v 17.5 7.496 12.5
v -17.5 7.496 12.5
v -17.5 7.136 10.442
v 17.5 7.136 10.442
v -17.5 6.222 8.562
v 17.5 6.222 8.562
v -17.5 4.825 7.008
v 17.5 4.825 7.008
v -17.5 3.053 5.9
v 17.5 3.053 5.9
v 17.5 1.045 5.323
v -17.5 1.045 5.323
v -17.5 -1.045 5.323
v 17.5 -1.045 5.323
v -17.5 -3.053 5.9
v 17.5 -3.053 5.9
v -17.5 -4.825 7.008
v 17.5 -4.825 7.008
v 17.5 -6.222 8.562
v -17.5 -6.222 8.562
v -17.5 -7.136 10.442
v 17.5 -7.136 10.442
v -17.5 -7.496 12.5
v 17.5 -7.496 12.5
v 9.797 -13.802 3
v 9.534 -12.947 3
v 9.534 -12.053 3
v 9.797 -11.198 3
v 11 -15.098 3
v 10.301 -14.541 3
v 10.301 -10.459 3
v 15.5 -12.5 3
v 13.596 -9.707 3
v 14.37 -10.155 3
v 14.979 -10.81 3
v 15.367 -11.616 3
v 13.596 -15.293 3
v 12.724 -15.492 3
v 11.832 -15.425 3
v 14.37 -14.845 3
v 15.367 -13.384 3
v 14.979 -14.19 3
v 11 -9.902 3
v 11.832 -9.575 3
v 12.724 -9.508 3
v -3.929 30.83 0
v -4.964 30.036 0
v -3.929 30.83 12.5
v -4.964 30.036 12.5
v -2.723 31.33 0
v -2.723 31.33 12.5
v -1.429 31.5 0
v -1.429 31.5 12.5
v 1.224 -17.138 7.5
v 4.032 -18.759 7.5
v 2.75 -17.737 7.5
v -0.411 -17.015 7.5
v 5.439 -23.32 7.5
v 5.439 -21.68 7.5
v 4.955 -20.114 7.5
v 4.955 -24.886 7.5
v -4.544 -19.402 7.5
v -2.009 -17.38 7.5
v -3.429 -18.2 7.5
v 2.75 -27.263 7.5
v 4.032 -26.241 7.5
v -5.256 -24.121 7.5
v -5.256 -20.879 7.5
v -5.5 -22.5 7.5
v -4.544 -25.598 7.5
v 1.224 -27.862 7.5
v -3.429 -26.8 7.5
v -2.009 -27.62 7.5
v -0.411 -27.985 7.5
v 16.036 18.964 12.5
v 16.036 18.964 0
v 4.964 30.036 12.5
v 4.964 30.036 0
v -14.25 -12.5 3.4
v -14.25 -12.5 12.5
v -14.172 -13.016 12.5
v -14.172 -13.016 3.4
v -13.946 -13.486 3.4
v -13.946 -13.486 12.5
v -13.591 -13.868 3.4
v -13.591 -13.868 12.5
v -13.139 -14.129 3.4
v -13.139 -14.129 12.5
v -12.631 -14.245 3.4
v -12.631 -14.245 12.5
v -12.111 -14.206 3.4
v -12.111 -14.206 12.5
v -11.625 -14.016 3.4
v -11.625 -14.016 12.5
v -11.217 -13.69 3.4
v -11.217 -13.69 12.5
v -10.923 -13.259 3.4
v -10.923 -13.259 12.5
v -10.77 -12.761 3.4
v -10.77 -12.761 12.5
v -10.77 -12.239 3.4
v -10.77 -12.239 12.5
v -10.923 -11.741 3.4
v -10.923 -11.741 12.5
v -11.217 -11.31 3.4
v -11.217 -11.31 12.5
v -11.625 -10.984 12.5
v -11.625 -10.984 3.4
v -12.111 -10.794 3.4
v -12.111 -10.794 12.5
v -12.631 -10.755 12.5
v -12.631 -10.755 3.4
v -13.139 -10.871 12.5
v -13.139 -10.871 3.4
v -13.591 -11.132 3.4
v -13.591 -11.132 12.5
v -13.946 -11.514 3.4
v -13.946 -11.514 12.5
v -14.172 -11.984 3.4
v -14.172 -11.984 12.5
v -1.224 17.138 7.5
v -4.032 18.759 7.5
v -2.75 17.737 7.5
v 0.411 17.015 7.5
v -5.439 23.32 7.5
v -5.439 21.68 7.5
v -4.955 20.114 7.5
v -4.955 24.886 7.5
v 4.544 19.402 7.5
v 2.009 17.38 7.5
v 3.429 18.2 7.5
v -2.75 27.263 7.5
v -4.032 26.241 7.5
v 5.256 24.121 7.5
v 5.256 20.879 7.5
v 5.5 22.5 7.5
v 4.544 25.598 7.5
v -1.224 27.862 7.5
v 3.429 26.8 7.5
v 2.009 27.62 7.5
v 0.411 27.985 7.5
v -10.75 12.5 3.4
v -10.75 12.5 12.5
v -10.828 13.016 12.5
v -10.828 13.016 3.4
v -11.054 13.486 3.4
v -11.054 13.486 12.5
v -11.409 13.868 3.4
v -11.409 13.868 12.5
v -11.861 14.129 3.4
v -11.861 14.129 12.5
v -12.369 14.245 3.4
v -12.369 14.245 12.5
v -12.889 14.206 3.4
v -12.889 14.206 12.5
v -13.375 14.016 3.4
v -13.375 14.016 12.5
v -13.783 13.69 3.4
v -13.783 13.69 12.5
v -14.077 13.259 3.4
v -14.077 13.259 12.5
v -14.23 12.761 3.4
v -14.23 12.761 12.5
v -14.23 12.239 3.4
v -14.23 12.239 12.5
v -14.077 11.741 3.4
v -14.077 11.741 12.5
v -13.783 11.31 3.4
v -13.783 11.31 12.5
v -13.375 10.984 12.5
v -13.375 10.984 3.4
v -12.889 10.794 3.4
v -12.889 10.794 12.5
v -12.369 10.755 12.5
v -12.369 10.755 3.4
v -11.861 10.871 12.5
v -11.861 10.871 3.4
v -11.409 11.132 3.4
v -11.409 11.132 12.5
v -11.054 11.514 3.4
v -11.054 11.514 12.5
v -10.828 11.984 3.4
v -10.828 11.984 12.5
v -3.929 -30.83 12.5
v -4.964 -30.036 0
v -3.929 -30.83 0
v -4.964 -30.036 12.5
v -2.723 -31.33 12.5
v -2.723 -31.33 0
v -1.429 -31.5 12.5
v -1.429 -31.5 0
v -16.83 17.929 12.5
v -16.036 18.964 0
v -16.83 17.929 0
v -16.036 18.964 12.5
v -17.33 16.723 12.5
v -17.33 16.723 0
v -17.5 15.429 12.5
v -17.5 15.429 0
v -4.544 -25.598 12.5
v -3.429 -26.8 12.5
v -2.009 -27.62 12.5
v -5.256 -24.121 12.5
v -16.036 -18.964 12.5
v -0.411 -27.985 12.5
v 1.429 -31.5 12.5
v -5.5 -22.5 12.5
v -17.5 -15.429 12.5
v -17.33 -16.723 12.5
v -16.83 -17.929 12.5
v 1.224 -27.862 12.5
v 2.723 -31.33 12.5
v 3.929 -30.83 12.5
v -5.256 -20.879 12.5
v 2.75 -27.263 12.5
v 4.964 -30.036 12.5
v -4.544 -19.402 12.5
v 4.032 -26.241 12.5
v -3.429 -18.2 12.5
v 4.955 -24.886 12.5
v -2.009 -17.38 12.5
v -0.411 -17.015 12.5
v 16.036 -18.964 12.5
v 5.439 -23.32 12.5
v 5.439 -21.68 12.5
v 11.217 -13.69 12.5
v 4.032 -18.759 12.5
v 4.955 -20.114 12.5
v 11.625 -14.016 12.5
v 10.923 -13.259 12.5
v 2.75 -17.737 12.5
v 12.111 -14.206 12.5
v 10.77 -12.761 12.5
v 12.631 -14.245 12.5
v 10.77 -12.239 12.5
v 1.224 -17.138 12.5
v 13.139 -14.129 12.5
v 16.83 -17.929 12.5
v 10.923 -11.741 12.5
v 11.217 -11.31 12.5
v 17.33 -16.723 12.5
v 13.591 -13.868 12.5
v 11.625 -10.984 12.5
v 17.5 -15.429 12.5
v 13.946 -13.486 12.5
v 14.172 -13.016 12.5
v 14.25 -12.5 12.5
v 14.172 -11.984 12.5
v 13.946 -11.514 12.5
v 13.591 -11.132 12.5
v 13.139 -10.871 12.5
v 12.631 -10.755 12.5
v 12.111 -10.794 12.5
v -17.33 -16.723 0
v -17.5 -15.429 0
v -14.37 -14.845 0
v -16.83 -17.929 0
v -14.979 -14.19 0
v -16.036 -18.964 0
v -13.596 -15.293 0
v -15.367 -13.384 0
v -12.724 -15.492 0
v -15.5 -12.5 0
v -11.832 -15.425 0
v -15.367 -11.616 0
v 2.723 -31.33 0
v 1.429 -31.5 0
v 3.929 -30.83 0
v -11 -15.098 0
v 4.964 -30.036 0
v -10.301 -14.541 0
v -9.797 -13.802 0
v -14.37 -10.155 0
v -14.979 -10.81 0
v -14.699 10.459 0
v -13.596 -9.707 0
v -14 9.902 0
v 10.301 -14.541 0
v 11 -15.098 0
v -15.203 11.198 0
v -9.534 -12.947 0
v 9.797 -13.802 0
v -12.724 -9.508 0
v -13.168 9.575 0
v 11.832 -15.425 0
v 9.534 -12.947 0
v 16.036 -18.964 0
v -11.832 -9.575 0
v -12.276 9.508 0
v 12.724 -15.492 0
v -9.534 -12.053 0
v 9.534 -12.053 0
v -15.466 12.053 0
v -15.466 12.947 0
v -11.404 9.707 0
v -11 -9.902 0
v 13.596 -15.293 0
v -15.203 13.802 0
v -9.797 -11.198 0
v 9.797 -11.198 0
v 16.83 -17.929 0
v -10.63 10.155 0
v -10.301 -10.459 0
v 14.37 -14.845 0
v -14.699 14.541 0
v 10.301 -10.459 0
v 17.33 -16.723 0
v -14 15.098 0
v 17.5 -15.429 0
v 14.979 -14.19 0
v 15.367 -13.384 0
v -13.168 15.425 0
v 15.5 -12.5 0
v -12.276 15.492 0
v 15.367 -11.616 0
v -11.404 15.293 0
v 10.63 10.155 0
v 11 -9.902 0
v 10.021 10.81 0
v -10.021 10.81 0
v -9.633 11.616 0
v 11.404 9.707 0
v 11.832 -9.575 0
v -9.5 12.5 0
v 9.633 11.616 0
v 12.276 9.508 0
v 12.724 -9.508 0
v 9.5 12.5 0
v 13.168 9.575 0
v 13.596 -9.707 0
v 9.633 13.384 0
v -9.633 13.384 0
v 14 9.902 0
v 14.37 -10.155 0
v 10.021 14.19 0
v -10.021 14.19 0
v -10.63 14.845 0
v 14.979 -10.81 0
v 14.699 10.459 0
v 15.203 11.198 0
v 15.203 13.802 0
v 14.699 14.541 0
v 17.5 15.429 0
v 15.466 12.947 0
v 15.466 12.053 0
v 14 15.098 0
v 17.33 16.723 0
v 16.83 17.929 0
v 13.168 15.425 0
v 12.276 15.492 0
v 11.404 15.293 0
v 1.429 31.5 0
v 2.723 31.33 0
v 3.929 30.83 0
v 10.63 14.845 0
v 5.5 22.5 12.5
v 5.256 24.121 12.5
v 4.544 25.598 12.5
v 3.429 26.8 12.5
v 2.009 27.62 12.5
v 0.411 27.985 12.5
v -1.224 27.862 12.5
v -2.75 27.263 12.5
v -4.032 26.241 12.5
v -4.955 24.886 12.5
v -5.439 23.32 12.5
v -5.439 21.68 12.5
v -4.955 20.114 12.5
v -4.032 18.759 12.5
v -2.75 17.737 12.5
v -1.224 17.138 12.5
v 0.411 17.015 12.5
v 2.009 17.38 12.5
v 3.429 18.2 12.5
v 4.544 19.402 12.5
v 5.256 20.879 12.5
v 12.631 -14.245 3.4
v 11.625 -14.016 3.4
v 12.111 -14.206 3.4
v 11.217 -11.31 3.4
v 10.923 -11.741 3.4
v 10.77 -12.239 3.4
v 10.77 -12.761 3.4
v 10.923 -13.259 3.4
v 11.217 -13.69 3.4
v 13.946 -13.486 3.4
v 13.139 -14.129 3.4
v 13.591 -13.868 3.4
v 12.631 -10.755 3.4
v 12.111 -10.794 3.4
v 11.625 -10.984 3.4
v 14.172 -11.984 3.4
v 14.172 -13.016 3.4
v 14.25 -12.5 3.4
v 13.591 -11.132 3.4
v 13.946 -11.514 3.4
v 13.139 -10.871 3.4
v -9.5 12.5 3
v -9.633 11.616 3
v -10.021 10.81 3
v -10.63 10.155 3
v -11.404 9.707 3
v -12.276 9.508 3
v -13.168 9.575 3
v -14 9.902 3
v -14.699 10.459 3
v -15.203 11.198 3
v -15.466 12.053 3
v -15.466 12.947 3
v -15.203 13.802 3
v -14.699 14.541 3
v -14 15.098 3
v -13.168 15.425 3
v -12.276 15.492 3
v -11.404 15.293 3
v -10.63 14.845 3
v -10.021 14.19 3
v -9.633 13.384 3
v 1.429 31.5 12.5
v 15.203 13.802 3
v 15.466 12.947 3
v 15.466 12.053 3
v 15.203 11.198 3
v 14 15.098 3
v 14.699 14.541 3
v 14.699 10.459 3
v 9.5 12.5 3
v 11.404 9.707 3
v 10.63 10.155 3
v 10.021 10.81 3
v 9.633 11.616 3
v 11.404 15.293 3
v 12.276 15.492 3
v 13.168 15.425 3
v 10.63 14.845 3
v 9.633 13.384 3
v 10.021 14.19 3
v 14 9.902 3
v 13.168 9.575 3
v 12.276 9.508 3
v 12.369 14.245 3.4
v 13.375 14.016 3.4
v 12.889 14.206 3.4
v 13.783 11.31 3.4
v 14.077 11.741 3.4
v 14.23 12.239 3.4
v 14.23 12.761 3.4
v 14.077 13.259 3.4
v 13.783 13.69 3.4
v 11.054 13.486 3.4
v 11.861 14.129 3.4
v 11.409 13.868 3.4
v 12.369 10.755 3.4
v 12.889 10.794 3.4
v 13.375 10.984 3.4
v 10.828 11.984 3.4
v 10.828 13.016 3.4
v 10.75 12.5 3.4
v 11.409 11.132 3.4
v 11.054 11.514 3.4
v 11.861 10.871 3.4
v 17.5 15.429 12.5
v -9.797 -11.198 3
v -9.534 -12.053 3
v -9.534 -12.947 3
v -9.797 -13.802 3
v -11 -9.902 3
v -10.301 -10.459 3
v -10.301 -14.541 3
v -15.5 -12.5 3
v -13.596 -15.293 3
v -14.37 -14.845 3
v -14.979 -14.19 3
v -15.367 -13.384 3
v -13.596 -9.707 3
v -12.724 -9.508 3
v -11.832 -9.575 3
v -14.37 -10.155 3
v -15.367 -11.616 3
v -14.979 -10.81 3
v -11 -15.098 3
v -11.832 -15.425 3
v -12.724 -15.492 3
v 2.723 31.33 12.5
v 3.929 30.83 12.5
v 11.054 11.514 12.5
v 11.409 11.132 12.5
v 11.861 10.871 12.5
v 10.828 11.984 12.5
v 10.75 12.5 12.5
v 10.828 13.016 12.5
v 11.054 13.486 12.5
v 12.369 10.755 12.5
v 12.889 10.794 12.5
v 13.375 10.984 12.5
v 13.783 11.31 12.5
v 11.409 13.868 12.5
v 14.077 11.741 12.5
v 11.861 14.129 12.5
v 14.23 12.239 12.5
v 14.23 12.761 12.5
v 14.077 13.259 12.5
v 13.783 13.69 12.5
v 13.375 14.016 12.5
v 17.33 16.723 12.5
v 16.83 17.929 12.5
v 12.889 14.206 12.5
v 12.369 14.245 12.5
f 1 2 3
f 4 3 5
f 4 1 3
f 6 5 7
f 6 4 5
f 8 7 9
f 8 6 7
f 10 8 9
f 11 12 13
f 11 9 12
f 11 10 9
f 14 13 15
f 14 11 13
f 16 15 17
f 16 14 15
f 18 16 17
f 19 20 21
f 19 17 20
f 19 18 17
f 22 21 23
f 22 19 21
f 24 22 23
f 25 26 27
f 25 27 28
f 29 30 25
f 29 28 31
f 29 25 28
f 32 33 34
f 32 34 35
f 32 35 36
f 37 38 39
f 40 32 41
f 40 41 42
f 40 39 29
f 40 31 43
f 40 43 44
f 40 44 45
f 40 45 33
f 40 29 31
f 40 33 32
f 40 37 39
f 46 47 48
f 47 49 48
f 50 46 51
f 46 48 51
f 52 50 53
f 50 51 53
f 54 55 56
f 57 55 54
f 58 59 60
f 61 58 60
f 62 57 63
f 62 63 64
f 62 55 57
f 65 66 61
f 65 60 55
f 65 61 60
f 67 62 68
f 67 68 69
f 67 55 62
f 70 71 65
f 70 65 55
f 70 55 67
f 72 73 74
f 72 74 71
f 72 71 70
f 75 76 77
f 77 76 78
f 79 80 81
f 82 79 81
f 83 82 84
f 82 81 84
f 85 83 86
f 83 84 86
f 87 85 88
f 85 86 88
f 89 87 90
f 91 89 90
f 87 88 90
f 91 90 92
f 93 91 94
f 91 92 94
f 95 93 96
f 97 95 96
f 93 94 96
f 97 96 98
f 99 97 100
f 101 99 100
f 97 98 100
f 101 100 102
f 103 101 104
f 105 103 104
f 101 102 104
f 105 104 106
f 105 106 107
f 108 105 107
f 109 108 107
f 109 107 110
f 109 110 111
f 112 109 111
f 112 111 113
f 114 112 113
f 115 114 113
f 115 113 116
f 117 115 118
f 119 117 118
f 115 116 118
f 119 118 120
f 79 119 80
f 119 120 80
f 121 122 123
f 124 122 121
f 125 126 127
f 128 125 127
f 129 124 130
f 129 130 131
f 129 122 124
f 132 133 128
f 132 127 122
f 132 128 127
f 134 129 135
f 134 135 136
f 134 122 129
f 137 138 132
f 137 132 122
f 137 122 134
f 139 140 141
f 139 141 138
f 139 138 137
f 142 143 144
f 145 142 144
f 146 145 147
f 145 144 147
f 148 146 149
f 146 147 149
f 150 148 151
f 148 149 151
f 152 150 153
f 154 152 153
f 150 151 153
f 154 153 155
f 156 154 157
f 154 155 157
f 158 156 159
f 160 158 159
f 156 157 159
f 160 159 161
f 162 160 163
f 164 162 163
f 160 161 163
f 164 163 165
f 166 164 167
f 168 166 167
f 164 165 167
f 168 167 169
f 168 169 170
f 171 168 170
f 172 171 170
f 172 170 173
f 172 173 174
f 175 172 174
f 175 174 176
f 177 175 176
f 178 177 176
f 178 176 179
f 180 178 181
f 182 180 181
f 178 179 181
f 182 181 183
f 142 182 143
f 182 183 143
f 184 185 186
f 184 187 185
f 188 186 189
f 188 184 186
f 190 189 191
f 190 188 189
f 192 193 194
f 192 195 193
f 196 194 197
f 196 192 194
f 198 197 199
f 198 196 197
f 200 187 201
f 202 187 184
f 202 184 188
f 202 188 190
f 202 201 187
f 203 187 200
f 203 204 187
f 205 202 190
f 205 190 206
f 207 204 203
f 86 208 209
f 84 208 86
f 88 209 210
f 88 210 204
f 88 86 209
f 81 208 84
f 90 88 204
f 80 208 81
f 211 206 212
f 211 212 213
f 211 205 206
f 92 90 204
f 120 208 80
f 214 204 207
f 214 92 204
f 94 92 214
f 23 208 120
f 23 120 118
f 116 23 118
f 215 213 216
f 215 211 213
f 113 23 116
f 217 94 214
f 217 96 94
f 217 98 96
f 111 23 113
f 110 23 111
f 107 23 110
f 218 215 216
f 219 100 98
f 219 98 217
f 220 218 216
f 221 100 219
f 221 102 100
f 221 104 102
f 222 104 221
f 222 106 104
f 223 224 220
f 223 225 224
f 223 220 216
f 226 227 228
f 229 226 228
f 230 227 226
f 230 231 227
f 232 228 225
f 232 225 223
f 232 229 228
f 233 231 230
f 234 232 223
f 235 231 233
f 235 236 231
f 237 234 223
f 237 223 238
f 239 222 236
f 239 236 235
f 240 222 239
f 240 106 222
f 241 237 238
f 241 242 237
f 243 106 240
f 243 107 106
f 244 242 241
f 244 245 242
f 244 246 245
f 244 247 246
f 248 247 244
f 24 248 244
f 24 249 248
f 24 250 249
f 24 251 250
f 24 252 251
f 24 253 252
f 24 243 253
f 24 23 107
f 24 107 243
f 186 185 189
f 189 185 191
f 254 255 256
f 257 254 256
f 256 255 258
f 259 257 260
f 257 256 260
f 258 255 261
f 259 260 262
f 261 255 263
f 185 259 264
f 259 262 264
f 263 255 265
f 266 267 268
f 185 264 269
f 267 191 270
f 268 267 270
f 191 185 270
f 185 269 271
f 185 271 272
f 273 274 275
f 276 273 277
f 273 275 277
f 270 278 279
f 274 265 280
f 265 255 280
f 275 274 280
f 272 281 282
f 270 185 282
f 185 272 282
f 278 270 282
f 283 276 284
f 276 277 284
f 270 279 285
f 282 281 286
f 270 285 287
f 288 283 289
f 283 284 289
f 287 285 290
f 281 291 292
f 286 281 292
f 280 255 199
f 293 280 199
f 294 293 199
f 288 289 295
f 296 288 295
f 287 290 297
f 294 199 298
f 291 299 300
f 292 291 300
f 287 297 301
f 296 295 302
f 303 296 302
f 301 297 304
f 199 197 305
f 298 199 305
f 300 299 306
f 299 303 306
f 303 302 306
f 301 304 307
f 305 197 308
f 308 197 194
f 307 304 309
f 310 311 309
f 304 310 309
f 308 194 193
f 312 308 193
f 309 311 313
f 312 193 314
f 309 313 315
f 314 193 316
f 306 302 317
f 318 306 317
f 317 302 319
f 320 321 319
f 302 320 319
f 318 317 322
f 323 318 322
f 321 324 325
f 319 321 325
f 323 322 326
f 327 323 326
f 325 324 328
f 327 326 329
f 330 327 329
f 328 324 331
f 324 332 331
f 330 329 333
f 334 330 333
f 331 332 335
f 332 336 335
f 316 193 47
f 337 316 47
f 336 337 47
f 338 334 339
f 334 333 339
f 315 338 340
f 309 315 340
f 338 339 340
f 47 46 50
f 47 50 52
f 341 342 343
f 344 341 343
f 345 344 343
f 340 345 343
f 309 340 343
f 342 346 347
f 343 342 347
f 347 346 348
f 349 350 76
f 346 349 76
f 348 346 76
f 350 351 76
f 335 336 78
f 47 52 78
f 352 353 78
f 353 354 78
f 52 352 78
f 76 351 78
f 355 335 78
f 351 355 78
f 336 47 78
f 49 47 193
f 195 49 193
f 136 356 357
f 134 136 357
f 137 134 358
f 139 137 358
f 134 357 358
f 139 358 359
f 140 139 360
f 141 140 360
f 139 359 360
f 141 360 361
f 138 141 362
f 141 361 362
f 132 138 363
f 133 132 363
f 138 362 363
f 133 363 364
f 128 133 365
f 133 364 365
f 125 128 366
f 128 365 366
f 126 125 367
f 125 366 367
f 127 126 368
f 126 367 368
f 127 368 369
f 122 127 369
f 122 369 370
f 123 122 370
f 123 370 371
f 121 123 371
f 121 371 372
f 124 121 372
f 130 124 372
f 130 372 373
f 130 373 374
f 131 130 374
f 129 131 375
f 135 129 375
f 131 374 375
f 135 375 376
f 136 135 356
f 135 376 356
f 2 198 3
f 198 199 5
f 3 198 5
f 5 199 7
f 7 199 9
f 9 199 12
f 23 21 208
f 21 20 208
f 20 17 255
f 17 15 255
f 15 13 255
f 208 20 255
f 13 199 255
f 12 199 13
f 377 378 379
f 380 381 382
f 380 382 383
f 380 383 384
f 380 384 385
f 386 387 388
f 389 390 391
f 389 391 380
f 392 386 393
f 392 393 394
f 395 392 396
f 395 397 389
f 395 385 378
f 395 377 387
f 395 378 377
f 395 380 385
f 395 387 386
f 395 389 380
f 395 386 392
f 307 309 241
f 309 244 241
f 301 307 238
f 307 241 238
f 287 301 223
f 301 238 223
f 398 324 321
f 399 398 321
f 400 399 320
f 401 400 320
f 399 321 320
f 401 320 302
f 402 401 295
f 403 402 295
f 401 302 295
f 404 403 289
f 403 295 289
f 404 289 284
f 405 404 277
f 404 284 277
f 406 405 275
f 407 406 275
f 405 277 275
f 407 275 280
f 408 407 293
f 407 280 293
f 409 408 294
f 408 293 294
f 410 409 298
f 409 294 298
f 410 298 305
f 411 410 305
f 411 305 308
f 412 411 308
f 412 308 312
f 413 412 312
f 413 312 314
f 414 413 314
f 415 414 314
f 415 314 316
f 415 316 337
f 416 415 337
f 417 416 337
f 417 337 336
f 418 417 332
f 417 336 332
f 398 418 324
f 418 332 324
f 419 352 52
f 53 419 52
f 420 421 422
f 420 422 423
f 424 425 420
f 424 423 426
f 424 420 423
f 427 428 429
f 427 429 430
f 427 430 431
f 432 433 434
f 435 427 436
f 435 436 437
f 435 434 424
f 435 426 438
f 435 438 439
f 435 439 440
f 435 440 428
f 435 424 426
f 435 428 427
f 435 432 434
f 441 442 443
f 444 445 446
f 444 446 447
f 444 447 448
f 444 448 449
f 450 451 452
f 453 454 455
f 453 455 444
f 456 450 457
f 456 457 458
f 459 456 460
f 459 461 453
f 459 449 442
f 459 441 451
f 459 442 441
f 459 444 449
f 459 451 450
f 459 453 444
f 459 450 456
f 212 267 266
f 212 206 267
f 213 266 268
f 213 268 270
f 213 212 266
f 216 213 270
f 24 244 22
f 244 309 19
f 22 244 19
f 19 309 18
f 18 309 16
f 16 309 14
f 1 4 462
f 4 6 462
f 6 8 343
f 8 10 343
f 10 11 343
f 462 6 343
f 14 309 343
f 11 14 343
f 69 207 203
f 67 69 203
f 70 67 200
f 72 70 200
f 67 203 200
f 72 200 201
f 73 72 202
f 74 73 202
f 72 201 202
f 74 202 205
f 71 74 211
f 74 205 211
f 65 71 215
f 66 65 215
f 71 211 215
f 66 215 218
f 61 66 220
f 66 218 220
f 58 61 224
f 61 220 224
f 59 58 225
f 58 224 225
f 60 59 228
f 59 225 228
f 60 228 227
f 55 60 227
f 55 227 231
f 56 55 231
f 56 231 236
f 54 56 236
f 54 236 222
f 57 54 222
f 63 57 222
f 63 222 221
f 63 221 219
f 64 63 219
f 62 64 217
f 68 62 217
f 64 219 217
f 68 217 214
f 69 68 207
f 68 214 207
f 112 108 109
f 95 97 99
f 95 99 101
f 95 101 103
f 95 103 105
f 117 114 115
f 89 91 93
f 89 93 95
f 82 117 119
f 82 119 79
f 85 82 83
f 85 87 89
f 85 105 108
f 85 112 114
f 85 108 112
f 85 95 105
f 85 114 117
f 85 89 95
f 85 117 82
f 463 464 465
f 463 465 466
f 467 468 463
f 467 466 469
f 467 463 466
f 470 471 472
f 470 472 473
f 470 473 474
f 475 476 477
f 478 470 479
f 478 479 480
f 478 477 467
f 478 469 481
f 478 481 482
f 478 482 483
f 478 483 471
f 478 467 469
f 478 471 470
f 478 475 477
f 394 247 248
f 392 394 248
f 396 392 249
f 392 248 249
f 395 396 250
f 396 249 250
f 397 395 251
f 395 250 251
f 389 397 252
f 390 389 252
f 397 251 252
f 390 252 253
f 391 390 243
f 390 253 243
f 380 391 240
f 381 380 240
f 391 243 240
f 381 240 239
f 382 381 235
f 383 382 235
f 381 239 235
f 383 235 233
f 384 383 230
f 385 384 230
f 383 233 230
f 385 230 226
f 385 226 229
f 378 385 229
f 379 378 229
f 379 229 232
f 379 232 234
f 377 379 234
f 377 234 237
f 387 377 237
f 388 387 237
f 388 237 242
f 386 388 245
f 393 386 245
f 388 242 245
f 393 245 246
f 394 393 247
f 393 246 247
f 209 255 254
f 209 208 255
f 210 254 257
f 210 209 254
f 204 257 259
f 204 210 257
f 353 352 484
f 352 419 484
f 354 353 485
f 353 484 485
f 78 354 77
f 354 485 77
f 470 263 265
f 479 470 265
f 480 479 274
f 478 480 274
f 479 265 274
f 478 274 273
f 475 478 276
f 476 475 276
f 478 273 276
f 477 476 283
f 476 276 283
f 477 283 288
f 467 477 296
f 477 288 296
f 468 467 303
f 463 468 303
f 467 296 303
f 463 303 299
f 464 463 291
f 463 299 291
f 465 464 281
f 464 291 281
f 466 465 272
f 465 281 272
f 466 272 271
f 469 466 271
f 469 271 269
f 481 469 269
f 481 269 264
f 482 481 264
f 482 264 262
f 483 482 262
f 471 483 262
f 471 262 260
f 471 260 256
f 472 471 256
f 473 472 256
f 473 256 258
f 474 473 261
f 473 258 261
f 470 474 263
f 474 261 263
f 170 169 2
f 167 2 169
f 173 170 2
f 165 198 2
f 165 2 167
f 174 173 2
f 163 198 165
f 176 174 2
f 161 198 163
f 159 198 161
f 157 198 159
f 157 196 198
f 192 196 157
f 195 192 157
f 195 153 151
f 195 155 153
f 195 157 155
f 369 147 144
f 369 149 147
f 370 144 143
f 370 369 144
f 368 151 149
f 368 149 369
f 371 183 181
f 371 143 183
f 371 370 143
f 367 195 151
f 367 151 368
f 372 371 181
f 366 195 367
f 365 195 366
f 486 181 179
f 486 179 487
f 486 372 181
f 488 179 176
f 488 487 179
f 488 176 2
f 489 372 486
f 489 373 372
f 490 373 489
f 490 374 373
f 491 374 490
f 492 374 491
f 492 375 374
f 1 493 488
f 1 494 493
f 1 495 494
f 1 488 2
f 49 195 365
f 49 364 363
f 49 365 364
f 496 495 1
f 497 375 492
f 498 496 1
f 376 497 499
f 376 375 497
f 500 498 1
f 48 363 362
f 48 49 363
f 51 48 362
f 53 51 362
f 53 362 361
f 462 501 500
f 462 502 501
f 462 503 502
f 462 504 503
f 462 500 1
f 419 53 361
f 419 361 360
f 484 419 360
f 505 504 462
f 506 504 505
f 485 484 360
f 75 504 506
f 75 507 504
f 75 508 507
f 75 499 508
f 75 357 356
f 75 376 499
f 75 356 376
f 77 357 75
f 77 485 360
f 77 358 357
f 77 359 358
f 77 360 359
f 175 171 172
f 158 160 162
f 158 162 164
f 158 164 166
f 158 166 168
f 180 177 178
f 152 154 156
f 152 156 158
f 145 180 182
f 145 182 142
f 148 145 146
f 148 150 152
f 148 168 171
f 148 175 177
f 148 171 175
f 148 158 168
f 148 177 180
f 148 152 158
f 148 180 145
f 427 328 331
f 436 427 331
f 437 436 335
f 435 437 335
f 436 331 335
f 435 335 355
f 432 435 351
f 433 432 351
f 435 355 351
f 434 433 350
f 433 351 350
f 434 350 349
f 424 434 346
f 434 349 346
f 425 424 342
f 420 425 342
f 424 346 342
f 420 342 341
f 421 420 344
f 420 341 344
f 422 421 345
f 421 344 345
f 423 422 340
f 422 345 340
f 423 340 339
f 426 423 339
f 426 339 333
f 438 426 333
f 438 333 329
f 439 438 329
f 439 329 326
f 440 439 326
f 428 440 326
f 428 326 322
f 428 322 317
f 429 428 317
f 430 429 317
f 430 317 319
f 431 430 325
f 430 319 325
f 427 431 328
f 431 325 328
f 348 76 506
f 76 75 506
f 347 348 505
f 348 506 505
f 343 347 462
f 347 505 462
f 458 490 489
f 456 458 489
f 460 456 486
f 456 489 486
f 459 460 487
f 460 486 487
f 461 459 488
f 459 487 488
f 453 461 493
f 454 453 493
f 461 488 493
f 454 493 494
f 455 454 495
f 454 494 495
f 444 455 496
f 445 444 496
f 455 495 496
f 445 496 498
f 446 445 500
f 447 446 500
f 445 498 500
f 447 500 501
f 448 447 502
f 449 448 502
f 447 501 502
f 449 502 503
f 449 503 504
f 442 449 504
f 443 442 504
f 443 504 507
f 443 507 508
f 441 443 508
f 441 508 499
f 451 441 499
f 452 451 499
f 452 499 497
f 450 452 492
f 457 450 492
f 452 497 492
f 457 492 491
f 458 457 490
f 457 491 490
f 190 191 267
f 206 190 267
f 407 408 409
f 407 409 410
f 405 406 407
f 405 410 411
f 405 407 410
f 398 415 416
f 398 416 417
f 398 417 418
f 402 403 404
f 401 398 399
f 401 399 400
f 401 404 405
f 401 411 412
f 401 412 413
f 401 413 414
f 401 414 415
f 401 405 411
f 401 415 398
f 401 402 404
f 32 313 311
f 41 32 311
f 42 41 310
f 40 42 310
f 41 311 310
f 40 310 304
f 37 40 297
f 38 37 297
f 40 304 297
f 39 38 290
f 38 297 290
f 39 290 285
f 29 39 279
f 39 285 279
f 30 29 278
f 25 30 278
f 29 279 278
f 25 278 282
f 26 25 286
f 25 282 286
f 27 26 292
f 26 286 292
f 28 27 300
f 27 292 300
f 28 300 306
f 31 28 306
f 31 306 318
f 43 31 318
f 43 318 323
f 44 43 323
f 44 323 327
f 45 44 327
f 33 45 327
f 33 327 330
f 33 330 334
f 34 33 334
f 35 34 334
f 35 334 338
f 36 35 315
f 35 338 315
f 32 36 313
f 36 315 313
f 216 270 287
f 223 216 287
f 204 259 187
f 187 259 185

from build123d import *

# Parameters (mm, degrees)
BOSS_EXTRUDE1_DEPTH = 12.5
CUT_EXTRUDE1_REACH  = 50.719
SKETCH3_R           = 3
CUT_EXTRUDE2_DEPTH  = 3
SKETCH4_R           = 5.5
CUT_EXTRUDE3_DEPTH  = 5
FILLET1_R           = 5
SKETCH5_R           = 1.75
CUT_EXTRUDE4_DEPTH  = 9.1


with BuildPart() as part:
    # Sketch1 → Boss-Extrude1 (new body)
    with BuildSketch(Plane.XY):
        Polygon((-3.5, 31.5), (-17.5, 17.5), (-17.5, -17.5), (-3.5, -31.5), (3.5, -31.5), (17.5, -17.5), (17.5, 17.5), (3.5, 31.5), align=None)
    extrude(amount=BOSS_EXTRUDE1_DEPTH)

    # Sketch2 → Cut-Extrude1 (cut, up to next)
    with BuildSketch(Plane(origin=(17.5, 0, 0), x_dir=(0, 0, -1), z_dir=(1, 0, 0)), mode=Mode.PRIVATE) as cut_extrude1_sk1:
        with BuildLine():
            Line((-12.5, -7.495832175), (-12.5, 7.495832175))
            ThreePointArc((-12.5, 7.495832175), (-5.25, 0), (-12.5, -7.495832175))
        make_face()
    cut_extrude1_tool1 = extrude(cut_extrude1_sk1.sketch, amount=-CUT_EXTRUDE1_REACH, mode=Mode.PRIVATE) & part.part
    add(cut_extrude1_tool1.solids().sort_by_distance((17.5, 0, 9.431384))[0], mode=Mode.SUBTRACT)

    # Sketch3 → Cut-Extrude2 (cut)
    with BuildSketch(Plane(origin=(0, 0, 0), x_dir=(-1, 0, 0), z_dir=(0, 0, -1))):
        with Locations((-12.5, 12.5)):
            Circle(SKETCH3_R)
        with Locations(Location((12.5, 12.5, 0), (0, 0, 180))):
            Circle(SKETCH3_R)
        with Locations((12.5, -12.5)):
            Circle(SKETCH3_R)
        with Locations(Location((-12.5, -12.5, 0), (0, 0, 180))):
            Circle(SKETCH3_R)
    extrude(amount=-CUT_EXTRUDE2_DEPTH, mode=Mode.SUBTRACT)

    # Sketch4 → Cut-Extrude3 (cut)
    with BuildSketch(Plane.XY.offset(12.5)):
        with Locations((0, 22.5)):
            Circle(SKETCH4_R)
        with Locations(Location((0, -22.5, 0), (0, 0, 180))):
            Circle(SKETCH4_R)
    extrude(amount=-CUT_EXTRUDE3_DEPTH, mode=Mode.SUBTRACT)

    # Fillet1
    fillet1_edges = [part.edges().sort_by_distance(p)[0] for p in [
        (3.5, 31.5, 6.25),
        (17.5, 17.5, 6.25),
        (17.5, -17.5, 6.25),
        (3.5, -31.5, 6.25),
        (-3.5, -31.5, 6.25),
        (-17.5, -17.5, 6.25),
        (-17.5, 17.5, 6.25),
        (-3.5, 31.5, 6.25),
    ]]
    fillet(fillet1_edges, radius=FILLET1_R)

    # Sketch5 → Cut-Extrude4 (cut)
    with BuildSketch(Plane.XY.offset(12.5)):
        with Locations((-12.5, 12.5)):
            Circle(SKETCH5_R)
        with Locations(Location((12.5, 12.5, 0), (0, 0, 180))):
            Circle(SKETCH5_R)
        with Locations((12.5, -12.5)):
            Circle(SKETCH5_R)
        with Locations(Location((-12.5, -12.5, 0), (0, 0, 180))):
            Circle(SKETCH5_R)
    extrude(amount=-CUT_EXTRUDE4_DEPTH, mode=Mode.SUBTRACT)


solid = part.part
